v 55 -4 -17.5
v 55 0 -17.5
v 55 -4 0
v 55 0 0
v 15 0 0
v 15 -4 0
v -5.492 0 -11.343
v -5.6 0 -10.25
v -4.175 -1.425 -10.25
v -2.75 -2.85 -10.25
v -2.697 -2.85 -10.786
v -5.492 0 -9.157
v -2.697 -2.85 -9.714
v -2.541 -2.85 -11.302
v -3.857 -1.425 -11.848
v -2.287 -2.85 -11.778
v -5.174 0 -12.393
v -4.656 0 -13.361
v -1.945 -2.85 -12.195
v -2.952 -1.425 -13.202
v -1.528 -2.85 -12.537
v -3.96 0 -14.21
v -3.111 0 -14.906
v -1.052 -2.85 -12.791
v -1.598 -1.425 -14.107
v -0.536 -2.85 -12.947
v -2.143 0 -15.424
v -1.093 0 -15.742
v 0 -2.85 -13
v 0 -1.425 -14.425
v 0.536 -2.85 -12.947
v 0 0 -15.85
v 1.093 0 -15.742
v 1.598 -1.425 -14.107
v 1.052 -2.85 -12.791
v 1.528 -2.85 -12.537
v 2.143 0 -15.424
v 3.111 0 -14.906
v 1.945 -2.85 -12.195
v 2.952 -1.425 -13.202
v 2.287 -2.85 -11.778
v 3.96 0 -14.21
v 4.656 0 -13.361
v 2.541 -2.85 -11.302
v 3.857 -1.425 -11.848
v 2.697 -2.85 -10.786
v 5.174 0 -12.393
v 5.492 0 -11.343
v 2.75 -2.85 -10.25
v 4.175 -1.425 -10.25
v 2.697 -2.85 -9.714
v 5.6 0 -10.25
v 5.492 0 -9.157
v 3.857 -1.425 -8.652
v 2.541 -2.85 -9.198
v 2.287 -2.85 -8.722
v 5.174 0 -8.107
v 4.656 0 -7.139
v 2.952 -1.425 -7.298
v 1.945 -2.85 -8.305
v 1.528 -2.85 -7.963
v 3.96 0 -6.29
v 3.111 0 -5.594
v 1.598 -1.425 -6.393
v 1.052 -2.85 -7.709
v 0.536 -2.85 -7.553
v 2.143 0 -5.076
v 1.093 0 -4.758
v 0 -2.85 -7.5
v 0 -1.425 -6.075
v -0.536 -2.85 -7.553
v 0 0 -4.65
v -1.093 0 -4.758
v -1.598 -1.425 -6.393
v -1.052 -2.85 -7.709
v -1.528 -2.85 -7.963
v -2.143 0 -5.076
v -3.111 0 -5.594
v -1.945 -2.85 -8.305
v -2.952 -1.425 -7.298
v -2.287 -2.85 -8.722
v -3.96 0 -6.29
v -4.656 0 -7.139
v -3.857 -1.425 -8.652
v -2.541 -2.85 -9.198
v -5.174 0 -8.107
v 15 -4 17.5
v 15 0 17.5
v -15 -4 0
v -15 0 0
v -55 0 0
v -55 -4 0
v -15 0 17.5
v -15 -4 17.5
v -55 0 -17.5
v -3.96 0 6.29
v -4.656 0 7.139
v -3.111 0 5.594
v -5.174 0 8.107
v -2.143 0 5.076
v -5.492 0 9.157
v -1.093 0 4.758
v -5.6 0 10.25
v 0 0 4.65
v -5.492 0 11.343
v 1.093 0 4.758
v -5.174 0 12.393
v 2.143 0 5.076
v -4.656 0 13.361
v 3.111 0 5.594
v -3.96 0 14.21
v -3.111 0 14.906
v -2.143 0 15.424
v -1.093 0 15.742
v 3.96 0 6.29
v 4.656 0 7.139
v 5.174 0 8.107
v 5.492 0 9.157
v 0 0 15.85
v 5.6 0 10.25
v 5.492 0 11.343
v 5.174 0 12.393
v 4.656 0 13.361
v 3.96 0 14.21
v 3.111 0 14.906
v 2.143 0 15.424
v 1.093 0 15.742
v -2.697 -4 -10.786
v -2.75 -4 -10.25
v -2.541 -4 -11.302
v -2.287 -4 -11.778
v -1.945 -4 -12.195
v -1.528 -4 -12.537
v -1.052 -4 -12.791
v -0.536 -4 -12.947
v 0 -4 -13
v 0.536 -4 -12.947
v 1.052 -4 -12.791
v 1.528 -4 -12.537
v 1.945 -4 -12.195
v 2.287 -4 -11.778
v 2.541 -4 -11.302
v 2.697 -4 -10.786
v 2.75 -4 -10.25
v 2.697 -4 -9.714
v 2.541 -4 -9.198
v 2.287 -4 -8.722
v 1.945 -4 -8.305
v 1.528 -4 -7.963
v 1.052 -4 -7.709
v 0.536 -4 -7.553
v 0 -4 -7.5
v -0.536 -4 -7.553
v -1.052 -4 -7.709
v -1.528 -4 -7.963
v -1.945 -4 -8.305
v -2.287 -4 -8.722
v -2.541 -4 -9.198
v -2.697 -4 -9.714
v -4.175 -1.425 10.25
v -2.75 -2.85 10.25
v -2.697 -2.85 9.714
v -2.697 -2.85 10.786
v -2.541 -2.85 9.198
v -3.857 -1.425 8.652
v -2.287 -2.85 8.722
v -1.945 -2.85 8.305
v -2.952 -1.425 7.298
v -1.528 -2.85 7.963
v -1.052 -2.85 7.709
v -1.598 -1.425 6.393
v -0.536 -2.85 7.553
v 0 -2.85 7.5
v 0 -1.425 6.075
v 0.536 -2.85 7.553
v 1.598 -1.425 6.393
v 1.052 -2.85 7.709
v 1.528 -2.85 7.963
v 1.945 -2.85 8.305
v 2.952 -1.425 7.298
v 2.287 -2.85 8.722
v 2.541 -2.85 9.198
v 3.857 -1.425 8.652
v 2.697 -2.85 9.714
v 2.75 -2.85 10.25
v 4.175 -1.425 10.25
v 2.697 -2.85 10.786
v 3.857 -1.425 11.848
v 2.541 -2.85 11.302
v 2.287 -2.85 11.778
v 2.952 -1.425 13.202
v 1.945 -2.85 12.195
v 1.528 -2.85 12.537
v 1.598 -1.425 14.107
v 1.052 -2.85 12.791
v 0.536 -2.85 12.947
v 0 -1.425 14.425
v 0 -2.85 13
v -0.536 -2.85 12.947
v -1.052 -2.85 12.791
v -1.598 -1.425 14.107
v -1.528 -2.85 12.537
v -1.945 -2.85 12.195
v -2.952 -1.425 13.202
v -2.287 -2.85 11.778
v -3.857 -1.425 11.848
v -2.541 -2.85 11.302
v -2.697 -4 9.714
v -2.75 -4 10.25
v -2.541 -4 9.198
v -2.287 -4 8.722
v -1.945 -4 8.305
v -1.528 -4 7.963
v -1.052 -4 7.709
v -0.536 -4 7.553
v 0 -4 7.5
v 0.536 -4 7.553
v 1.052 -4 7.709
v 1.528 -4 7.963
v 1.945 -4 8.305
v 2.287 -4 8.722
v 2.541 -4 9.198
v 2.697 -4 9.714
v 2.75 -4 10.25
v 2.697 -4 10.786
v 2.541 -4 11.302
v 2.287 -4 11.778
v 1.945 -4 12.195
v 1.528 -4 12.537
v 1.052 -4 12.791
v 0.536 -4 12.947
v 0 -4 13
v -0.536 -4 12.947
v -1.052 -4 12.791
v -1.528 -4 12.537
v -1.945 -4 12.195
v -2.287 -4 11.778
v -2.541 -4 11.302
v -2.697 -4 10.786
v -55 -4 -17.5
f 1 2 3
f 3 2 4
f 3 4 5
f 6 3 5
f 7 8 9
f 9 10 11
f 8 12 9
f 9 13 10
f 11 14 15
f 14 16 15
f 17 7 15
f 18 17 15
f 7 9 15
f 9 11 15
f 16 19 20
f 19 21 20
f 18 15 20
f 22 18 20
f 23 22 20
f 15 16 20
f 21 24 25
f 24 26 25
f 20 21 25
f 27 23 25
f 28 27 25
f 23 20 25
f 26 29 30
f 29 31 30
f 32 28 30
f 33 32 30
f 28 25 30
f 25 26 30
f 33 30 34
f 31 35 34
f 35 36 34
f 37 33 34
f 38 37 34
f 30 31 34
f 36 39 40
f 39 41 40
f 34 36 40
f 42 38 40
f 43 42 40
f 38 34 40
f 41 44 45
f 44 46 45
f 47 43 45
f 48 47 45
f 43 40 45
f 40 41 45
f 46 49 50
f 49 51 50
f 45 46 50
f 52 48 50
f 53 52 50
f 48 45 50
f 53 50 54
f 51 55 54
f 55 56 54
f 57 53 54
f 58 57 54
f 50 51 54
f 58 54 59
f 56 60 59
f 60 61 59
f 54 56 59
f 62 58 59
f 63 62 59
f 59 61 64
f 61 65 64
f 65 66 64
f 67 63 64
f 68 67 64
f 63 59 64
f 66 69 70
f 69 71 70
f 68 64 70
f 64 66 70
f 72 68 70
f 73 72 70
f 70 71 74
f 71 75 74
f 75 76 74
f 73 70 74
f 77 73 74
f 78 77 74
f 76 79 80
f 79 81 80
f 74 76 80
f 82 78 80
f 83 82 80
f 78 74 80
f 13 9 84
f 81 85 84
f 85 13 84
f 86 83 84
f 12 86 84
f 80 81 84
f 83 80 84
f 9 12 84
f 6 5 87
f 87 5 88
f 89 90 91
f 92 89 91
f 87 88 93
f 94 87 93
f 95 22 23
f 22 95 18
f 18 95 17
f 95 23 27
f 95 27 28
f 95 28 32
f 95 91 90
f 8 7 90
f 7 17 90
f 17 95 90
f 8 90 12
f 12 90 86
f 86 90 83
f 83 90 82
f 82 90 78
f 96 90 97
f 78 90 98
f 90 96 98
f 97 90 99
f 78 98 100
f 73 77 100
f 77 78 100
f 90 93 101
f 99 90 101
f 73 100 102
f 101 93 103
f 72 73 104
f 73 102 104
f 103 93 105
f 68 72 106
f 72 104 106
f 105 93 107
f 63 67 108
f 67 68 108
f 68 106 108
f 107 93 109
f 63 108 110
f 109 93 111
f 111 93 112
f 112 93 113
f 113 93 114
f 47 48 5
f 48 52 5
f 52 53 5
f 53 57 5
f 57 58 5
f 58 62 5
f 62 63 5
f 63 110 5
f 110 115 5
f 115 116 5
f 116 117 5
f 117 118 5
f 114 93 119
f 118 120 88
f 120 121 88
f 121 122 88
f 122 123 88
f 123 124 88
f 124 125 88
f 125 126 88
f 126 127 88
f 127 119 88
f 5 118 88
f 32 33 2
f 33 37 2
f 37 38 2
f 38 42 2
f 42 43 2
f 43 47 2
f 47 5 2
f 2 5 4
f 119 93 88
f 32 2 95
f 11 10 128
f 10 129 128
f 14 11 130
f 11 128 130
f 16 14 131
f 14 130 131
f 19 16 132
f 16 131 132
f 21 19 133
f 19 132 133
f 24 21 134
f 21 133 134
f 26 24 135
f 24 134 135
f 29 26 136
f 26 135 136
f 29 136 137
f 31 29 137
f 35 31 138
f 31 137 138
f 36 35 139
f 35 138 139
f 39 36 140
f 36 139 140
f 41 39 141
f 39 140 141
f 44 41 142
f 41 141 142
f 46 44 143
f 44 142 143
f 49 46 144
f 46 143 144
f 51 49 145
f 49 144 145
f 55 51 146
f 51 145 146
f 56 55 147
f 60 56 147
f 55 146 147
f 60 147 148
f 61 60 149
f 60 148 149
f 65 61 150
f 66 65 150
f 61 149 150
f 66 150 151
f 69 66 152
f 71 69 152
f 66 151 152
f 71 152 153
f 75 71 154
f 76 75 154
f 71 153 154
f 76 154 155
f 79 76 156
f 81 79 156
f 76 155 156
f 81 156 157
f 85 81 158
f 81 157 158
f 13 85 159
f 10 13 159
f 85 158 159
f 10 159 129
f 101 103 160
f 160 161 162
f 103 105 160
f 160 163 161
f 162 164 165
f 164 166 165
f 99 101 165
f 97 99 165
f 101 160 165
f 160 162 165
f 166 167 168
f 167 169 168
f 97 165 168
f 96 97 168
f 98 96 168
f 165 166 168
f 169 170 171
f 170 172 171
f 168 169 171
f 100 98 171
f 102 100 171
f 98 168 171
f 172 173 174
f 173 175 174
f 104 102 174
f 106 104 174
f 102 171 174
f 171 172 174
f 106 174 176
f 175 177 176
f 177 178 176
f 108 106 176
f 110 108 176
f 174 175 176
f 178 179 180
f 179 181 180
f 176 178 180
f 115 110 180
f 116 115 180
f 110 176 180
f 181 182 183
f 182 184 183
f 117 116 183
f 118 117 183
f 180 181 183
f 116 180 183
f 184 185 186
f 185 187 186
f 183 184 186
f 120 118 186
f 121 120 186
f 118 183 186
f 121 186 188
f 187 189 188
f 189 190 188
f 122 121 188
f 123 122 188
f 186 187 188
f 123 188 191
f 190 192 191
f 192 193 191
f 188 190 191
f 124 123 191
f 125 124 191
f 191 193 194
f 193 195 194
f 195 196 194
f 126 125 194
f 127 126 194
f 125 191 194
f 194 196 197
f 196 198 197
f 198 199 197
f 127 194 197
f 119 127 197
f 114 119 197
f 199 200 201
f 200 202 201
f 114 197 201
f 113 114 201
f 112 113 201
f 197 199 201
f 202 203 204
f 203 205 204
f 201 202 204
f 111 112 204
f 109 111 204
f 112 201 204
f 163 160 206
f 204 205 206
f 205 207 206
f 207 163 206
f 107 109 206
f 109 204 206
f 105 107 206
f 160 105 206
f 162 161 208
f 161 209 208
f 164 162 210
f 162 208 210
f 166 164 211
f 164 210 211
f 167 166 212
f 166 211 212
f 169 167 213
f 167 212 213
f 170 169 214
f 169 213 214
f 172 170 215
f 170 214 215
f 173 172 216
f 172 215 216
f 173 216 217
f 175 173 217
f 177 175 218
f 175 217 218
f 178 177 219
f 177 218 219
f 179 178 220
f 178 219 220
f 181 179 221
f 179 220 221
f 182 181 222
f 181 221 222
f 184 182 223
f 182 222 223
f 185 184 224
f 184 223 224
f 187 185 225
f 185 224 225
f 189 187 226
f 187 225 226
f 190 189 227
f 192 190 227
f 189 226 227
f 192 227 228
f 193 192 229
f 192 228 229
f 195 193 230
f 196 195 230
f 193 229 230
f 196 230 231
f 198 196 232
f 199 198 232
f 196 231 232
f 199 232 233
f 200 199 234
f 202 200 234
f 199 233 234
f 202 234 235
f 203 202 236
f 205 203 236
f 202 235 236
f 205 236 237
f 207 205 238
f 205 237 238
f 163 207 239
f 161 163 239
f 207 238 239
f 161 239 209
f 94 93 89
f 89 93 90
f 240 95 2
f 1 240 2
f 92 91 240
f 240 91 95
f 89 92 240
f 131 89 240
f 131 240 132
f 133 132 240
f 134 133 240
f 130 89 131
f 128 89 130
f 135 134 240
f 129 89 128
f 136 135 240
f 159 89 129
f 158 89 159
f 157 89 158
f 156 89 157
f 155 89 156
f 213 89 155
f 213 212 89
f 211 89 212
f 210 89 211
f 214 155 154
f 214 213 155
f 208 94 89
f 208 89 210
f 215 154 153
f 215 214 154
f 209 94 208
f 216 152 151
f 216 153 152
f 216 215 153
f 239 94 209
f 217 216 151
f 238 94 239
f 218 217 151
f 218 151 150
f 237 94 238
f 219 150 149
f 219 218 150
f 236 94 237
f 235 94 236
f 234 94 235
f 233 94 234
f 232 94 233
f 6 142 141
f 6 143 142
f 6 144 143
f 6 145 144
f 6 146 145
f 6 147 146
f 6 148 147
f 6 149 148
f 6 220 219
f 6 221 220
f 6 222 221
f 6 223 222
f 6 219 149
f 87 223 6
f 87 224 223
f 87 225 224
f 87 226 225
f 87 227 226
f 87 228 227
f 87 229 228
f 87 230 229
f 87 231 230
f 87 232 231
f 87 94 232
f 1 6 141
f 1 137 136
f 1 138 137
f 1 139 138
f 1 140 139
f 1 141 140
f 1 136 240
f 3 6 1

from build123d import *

# Parameters (mm, degrees)
F1_DEPTH       = 4
F2_D           = 5.5
F2_CSINK_D     = 11.2
F2_CSINK_ANGLE = 90


with BuildPart() as f1:
    # F0 (on Front) → F1 (new body)
    with BuildSketch(Plane.XZ):
        Polygon((15, 0), (15, 17.5), (-15, 17.5), (-15, 0), (-55, 0), (-55, -17.5), (55, -17.5), (55, 0), align=None)
    extrude(amount=F1_DEPTH)

    # F2 (through all)
    with Locations(Plane(origin=(0, 0, 0), x_dir=(1, 0, 0), z_dir=(0, 1, 0))):
        with Locations((0, -10.25), (0, 10.25)):
            CounterSinkHole(F2_D / 2, F2_CSINK_D / 2, counter_sink_angle=F2_CSINK_ANGLE)


solid = f1.part
